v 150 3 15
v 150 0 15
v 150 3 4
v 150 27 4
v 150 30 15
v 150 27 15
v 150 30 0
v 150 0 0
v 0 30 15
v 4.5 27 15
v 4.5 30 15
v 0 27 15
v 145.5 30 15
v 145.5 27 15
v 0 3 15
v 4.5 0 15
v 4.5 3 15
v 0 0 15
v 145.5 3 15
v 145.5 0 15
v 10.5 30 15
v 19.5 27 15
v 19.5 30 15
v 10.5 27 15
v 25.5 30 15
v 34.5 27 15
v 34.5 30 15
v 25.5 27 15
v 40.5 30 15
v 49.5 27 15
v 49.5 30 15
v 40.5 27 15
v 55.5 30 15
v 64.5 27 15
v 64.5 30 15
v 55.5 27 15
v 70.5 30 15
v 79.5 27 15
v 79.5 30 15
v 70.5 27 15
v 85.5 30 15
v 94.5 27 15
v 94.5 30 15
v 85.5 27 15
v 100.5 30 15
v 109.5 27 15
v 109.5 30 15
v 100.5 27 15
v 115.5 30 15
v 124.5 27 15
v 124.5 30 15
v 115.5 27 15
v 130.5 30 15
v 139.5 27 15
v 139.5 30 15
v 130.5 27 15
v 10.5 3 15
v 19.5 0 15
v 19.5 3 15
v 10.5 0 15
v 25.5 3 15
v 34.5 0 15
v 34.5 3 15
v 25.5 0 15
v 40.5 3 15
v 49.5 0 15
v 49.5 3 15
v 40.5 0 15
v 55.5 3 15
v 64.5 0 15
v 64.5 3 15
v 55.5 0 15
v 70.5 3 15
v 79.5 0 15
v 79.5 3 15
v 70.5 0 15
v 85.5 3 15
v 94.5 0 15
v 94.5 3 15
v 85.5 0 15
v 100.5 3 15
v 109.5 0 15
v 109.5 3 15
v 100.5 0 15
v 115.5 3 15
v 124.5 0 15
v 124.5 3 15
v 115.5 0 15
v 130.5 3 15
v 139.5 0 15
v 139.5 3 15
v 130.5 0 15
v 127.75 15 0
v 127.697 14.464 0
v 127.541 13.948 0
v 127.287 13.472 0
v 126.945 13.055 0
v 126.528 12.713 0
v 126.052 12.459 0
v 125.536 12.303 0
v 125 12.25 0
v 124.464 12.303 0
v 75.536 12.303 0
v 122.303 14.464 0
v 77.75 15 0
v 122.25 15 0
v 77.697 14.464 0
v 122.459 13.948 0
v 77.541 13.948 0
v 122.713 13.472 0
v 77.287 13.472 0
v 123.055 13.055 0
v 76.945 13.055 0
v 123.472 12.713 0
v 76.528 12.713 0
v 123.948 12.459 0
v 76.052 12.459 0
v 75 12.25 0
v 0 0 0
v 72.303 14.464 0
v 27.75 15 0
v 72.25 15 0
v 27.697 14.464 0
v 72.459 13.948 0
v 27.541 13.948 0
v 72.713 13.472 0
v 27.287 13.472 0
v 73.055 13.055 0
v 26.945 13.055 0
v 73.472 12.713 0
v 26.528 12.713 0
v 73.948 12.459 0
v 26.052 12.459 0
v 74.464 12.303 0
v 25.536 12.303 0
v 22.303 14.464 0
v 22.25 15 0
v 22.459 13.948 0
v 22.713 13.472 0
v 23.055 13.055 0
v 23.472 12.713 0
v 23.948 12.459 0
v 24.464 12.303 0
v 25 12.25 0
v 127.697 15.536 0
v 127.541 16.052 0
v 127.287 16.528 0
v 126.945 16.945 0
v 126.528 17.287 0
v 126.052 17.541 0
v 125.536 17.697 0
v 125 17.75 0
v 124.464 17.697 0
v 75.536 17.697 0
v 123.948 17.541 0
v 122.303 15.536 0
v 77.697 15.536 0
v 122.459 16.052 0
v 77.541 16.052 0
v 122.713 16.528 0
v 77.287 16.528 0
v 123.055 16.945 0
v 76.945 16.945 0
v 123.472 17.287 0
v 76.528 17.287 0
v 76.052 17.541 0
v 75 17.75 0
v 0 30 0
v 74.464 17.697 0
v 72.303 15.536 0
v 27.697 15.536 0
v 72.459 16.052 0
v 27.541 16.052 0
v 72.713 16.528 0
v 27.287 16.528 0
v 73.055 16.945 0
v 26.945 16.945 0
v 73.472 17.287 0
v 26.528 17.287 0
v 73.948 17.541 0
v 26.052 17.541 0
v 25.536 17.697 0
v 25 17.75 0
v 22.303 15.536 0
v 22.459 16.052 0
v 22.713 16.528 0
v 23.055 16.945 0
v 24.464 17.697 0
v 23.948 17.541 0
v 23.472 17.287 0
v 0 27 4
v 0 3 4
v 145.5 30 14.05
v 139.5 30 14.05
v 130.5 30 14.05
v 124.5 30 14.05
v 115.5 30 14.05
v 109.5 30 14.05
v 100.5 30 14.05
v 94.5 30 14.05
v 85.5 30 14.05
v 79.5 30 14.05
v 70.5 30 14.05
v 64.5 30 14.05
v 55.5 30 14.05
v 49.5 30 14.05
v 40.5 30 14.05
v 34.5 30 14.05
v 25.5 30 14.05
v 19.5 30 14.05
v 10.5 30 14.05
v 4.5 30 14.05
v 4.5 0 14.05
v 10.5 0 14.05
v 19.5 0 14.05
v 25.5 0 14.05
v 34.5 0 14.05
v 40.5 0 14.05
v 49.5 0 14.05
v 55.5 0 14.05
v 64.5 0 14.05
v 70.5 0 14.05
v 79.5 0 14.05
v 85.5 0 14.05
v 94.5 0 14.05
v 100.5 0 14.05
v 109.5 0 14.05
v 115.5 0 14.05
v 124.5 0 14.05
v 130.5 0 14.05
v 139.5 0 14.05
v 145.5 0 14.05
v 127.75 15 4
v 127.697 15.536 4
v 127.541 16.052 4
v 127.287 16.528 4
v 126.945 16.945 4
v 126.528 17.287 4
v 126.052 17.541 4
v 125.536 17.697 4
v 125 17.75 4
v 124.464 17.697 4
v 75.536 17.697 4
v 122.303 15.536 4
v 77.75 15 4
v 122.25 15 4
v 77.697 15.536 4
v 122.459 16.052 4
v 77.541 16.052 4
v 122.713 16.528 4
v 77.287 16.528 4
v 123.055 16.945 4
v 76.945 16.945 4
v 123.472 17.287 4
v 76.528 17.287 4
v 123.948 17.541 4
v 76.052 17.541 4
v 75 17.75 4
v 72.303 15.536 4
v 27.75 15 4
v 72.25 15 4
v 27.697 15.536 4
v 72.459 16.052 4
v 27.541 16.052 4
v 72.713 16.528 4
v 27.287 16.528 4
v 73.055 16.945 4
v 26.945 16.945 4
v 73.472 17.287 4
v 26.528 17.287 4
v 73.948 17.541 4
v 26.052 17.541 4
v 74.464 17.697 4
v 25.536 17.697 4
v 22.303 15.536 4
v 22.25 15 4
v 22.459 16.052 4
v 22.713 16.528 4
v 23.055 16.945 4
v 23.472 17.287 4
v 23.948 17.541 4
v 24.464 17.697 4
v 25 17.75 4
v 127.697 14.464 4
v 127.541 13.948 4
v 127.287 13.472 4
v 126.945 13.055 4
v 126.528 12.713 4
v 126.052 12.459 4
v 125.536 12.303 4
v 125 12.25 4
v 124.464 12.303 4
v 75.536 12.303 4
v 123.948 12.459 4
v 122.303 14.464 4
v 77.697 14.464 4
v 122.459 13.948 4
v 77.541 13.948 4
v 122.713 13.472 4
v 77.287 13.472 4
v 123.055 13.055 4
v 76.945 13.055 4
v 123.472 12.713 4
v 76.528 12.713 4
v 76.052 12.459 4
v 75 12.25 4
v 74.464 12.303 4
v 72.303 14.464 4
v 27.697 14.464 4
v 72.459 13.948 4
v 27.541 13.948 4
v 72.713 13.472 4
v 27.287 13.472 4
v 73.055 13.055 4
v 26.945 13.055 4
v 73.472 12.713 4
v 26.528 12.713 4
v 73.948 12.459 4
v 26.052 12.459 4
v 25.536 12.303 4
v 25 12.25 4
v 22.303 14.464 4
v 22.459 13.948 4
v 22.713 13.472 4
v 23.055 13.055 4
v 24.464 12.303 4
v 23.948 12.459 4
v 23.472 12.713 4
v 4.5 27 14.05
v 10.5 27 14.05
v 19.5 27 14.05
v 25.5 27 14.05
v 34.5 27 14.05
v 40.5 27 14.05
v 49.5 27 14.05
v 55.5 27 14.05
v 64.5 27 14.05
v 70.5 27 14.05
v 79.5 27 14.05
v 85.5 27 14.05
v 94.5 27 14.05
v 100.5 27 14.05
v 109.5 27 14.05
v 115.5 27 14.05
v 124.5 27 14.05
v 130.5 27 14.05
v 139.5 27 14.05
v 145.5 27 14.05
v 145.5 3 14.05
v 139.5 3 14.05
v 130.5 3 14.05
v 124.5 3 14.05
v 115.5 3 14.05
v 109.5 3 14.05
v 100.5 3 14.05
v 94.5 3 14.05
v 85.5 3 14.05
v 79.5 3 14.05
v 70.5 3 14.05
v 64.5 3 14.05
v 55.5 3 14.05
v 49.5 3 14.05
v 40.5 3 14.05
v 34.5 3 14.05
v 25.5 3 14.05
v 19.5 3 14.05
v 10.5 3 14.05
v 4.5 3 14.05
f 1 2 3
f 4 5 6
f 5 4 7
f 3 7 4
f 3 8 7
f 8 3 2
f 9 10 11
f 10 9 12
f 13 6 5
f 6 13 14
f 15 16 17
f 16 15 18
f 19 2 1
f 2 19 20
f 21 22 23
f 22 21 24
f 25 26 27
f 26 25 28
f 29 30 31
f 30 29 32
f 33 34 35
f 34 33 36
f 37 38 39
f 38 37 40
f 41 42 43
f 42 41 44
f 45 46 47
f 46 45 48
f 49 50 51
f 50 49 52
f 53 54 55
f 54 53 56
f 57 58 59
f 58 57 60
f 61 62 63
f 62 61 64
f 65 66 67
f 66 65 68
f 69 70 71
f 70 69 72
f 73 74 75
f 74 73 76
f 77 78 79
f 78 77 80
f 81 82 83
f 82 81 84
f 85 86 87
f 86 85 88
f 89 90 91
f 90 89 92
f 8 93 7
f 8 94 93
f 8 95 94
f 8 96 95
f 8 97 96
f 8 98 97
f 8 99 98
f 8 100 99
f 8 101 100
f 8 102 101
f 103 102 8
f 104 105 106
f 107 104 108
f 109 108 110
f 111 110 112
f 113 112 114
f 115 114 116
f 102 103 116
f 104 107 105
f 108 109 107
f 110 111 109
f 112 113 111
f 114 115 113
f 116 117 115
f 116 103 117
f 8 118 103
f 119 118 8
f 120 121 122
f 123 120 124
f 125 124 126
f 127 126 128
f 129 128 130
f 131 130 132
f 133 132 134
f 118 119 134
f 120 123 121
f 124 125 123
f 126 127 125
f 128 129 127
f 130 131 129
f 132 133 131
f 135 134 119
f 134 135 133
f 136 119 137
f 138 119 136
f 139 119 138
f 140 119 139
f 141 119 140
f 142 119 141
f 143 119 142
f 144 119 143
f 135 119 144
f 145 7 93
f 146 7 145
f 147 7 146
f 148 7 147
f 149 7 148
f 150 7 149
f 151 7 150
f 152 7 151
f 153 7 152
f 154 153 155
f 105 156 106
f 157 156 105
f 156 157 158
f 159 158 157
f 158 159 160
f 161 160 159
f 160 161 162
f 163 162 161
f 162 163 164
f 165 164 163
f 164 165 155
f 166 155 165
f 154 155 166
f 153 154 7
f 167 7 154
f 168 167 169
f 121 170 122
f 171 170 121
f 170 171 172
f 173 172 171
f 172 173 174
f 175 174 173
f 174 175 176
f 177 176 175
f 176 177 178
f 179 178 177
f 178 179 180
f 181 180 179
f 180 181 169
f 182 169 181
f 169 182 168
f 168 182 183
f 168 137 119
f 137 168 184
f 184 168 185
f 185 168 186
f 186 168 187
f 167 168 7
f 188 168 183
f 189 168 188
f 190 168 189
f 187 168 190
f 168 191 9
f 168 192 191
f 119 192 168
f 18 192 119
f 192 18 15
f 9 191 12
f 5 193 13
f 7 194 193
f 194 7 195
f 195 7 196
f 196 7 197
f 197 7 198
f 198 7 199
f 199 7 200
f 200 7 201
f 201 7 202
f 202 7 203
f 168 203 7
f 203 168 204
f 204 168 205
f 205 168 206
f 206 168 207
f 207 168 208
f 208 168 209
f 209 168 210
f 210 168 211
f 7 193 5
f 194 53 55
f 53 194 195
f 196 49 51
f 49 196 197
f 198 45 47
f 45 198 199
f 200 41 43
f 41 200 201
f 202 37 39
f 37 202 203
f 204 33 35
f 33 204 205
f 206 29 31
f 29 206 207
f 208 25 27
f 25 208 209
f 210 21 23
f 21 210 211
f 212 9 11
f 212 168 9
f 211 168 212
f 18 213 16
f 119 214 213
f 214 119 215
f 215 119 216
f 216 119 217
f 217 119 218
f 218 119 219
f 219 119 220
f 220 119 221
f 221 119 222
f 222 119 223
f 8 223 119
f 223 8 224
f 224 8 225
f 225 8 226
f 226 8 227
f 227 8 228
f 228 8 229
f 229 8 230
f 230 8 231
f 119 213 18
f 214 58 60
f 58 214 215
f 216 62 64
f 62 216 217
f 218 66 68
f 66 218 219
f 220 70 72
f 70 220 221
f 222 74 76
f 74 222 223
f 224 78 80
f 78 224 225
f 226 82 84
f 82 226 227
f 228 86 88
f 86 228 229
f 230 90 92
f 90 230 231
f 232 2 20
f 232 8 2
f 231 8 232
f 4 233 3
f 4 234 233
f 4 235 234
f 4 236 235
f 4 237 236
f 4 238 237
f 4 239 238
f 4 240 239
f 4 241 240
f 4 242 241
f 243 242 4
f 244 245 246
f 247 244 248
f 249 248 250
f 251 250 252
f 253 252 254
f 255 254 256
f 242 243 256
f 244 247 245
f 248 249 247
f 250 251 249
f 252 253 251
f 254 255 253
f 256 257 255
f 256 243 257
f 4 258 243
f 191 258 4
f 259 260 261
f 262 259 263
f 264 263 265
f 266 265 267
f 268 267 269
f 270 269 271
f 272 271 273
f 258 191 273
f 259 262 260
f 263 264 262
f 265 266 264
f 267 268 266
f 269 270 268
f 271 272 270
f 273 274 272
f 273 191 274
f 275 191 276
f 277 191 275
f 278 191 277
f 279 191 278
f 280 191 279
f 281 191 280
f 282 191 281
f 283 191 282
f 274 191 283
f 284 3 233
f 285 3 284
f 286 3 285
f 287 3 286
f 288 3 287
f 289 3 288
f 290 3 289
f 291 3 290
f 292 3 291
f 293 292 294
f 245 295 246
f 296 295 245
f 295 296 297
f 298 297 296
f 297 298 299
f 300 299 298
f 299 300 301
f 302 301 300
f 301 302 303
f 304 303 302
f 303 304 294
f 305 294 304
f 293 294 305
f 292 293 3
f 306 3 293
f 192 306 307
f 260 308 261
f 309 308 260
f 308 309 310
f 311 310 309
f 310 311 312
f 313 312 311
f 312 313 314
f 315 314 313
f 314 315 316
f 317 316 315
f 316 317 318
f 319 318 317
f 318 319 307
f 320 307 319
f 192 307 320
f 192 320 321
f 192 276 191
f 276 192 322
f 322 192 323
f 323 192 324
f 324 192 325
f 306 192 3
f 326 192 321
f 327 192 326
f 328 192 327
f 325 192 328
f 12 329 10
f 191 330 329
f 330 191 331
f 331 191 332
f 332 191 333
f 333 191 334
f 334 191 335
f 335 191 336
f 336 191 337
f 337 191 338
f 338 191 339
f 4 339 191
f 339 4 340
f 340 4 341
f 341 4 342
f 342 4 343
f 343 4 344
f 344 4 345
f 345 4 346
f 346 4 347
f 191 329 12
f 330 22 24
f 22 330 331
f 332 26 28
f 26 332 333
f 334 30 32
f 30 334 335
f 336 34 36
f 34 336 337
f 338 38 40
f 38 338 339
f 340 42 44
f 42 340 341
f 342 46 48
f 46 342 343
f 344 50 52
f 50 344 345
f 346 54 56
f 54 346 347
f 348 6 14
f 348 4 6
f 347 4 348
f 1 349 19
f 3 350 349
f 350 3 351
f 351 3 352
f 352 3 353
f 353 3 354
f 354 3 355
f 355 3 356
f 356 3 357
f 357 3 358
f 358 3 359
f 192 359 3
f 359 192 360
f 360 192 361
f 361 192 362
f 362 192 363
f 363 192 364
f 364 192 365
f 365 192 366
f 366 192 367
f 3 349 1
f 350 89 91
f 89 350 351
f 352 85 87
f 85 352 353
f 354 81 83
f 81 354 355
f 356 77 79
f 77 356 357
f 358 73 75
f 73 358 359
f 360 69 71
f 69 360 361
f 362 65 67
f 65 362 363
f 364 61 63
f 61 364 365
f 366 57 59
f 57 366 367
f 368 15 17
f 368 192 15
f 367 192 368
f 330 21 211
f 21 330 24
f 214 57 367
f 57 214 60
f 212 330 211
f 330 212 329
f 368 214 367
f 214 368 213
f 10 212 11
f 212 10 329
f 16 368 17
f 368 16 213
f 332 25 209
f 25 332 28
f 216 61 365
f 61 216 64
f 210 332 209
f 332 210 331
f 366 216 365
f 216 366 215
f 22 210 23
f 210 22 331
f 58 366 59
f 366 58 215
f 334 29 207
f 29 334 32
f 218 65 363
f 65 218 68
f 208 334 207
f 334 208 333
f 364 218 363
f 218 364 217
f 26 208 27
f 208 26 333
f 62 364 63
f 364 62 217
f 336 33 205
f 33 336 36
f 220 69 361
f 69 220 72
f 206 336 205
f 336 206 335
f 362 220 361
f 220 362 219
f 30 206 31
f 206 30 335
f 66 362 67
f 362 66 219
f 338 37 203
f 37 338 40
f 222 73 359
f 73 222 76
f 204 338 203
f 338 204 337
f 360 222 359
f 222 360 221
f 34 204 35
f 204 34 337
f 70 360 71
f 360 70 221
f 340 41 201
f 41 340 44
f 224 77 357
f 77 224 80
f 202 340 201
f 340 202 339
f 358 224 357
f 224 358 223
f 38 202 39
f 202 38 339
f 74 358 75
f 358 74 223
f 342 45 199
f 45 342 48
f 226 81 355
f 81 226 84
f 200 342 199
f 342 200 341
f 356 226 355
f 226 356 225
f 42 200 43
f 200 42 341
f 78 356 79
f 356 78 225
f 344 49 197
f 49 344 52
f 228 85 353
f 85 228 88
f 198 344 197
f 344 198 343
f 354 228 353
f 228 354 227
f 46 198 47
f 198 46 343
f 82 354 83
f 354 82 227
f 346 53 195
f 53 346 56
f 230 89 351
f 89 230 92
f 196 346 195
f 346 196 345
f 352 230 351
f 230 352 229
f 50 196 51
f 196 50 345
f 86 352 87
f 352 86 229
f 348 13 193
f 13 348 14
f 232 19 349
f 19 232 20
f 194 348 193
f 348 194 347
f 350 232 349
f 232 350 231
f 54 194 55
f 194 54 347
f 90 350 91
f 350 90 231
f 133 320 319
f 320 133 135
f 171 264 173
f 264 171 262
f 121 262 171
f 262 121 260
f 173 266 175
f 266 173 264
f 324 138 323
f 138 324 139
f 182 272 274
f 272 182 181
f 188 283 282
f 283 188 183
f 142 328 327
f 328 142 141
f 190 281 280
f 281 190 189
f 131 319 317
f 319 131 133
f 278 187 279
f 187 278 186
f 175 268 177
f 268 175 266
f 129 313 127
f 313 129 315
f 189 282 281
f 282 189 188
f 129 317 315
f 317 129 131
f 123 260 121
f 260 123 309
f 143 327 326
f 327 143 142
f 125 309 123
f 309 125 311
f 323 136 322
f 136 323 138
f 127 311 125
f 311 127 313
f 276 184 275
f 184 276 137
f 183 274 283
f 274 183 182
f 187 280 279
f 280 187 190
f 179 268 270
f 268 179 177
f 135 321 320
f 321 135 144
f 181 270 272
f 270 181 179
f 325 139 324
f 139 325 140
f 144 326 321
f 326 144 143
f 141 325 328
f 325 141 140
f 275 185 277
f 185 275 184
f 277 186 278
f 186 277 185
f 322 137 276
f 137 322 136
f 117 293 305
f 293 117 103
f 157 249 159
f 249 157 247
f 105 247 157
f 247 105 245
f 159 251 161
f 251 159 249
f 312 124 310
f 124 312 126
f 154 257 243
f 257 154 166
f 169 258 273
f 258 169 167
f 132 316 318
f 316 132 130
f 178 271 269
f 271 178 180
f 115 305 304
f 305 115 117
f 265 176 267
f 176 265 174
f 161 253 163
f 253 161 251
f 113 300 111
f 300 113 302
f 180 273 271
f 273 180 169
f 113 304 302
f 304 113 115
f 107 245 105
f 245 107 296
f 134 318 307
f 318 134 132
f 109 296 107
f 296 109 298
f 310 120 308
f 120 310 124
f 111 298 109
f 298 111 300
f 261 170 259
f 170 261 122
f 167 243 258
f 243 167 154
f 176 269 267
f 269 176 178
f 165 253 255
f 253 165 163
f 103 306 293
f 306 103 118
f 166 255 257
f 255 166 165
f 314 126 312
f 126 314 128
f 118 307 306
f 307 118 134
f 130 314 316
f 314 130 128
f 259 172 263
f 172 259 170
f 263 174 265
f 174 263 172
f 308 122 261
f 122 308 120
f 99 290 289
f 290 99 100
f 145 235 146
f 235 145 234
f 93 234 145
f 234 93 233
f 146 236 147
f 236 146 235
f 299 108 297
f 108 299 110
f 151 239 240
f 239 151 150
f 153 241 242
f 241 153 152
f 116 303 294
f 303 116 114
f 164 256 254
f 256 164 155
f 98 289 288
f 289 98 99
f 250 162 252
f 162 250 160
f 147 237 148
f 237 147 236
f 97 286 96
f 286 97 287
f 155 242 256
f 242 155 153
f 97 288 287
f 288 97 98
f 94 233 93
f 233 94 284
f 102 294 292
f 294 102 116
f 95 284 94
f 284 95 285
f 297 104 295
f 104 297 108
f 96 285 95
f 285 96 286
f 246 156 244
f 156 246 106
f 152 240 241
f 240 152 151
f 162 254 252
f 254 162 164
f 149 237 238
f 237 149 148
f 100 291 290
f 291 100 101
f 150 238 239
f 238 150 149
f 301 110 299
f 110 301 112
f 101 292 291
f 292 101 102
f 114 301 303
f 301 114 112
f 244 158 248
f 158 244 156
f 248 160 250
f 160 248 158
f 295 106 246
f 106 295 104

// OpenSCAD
$fn = 32;

// ----------------------------------------------------------------------
// Cable duct: 150 x 30 x 15 mm, 10 fingers
// ----------------------------------------------------------------------

// --- parameters (mm) ---
duct_len = 150;           // duct length, X
duct_w = 30;              // duct width, Y
duct_h = 15;              // duct height, Z
wall_t = 3;               // side wall thickness
floor_t = 4;              // floor thickness
slot_w = 6;               // finger slot width
slot_h = 10.05;           // finger slot height
fingers = 10;             // number of finger slots per side
pitch = 15;               // finger pitch
hole_d = 5.5;             // floor mounting hole
hole_n = 3;               // mounting holes in the floor

module shell() {
  difference() {
    cube([duct_len, duct_w, duct_h]);
    /* open top channel */
    translate([-wall_t - 1, wall_t, floor_t])
      cube([duct_len + 2 * wall_t + 2, duct_w - 2 * wall_t, duct_h + 1]);
  }
}

difference() {
  union() {
    shell();
  }
  /* finger slots cut through both side walls */
  for (i = [0 : fingers - 1]) translate([pitch / 2 + i * pitch - slot_w / 2, -1, floor_t + slot_h]) cube([slot_w, duct_w + 2, duct_h]);
  for (i = [0 : hole_n - 1]) translate([(duct_len / hole_n) * (i + 0.5), duct_w / 2, -1]) cylinder(h = floor_t + 2, d = hole_d);
}
